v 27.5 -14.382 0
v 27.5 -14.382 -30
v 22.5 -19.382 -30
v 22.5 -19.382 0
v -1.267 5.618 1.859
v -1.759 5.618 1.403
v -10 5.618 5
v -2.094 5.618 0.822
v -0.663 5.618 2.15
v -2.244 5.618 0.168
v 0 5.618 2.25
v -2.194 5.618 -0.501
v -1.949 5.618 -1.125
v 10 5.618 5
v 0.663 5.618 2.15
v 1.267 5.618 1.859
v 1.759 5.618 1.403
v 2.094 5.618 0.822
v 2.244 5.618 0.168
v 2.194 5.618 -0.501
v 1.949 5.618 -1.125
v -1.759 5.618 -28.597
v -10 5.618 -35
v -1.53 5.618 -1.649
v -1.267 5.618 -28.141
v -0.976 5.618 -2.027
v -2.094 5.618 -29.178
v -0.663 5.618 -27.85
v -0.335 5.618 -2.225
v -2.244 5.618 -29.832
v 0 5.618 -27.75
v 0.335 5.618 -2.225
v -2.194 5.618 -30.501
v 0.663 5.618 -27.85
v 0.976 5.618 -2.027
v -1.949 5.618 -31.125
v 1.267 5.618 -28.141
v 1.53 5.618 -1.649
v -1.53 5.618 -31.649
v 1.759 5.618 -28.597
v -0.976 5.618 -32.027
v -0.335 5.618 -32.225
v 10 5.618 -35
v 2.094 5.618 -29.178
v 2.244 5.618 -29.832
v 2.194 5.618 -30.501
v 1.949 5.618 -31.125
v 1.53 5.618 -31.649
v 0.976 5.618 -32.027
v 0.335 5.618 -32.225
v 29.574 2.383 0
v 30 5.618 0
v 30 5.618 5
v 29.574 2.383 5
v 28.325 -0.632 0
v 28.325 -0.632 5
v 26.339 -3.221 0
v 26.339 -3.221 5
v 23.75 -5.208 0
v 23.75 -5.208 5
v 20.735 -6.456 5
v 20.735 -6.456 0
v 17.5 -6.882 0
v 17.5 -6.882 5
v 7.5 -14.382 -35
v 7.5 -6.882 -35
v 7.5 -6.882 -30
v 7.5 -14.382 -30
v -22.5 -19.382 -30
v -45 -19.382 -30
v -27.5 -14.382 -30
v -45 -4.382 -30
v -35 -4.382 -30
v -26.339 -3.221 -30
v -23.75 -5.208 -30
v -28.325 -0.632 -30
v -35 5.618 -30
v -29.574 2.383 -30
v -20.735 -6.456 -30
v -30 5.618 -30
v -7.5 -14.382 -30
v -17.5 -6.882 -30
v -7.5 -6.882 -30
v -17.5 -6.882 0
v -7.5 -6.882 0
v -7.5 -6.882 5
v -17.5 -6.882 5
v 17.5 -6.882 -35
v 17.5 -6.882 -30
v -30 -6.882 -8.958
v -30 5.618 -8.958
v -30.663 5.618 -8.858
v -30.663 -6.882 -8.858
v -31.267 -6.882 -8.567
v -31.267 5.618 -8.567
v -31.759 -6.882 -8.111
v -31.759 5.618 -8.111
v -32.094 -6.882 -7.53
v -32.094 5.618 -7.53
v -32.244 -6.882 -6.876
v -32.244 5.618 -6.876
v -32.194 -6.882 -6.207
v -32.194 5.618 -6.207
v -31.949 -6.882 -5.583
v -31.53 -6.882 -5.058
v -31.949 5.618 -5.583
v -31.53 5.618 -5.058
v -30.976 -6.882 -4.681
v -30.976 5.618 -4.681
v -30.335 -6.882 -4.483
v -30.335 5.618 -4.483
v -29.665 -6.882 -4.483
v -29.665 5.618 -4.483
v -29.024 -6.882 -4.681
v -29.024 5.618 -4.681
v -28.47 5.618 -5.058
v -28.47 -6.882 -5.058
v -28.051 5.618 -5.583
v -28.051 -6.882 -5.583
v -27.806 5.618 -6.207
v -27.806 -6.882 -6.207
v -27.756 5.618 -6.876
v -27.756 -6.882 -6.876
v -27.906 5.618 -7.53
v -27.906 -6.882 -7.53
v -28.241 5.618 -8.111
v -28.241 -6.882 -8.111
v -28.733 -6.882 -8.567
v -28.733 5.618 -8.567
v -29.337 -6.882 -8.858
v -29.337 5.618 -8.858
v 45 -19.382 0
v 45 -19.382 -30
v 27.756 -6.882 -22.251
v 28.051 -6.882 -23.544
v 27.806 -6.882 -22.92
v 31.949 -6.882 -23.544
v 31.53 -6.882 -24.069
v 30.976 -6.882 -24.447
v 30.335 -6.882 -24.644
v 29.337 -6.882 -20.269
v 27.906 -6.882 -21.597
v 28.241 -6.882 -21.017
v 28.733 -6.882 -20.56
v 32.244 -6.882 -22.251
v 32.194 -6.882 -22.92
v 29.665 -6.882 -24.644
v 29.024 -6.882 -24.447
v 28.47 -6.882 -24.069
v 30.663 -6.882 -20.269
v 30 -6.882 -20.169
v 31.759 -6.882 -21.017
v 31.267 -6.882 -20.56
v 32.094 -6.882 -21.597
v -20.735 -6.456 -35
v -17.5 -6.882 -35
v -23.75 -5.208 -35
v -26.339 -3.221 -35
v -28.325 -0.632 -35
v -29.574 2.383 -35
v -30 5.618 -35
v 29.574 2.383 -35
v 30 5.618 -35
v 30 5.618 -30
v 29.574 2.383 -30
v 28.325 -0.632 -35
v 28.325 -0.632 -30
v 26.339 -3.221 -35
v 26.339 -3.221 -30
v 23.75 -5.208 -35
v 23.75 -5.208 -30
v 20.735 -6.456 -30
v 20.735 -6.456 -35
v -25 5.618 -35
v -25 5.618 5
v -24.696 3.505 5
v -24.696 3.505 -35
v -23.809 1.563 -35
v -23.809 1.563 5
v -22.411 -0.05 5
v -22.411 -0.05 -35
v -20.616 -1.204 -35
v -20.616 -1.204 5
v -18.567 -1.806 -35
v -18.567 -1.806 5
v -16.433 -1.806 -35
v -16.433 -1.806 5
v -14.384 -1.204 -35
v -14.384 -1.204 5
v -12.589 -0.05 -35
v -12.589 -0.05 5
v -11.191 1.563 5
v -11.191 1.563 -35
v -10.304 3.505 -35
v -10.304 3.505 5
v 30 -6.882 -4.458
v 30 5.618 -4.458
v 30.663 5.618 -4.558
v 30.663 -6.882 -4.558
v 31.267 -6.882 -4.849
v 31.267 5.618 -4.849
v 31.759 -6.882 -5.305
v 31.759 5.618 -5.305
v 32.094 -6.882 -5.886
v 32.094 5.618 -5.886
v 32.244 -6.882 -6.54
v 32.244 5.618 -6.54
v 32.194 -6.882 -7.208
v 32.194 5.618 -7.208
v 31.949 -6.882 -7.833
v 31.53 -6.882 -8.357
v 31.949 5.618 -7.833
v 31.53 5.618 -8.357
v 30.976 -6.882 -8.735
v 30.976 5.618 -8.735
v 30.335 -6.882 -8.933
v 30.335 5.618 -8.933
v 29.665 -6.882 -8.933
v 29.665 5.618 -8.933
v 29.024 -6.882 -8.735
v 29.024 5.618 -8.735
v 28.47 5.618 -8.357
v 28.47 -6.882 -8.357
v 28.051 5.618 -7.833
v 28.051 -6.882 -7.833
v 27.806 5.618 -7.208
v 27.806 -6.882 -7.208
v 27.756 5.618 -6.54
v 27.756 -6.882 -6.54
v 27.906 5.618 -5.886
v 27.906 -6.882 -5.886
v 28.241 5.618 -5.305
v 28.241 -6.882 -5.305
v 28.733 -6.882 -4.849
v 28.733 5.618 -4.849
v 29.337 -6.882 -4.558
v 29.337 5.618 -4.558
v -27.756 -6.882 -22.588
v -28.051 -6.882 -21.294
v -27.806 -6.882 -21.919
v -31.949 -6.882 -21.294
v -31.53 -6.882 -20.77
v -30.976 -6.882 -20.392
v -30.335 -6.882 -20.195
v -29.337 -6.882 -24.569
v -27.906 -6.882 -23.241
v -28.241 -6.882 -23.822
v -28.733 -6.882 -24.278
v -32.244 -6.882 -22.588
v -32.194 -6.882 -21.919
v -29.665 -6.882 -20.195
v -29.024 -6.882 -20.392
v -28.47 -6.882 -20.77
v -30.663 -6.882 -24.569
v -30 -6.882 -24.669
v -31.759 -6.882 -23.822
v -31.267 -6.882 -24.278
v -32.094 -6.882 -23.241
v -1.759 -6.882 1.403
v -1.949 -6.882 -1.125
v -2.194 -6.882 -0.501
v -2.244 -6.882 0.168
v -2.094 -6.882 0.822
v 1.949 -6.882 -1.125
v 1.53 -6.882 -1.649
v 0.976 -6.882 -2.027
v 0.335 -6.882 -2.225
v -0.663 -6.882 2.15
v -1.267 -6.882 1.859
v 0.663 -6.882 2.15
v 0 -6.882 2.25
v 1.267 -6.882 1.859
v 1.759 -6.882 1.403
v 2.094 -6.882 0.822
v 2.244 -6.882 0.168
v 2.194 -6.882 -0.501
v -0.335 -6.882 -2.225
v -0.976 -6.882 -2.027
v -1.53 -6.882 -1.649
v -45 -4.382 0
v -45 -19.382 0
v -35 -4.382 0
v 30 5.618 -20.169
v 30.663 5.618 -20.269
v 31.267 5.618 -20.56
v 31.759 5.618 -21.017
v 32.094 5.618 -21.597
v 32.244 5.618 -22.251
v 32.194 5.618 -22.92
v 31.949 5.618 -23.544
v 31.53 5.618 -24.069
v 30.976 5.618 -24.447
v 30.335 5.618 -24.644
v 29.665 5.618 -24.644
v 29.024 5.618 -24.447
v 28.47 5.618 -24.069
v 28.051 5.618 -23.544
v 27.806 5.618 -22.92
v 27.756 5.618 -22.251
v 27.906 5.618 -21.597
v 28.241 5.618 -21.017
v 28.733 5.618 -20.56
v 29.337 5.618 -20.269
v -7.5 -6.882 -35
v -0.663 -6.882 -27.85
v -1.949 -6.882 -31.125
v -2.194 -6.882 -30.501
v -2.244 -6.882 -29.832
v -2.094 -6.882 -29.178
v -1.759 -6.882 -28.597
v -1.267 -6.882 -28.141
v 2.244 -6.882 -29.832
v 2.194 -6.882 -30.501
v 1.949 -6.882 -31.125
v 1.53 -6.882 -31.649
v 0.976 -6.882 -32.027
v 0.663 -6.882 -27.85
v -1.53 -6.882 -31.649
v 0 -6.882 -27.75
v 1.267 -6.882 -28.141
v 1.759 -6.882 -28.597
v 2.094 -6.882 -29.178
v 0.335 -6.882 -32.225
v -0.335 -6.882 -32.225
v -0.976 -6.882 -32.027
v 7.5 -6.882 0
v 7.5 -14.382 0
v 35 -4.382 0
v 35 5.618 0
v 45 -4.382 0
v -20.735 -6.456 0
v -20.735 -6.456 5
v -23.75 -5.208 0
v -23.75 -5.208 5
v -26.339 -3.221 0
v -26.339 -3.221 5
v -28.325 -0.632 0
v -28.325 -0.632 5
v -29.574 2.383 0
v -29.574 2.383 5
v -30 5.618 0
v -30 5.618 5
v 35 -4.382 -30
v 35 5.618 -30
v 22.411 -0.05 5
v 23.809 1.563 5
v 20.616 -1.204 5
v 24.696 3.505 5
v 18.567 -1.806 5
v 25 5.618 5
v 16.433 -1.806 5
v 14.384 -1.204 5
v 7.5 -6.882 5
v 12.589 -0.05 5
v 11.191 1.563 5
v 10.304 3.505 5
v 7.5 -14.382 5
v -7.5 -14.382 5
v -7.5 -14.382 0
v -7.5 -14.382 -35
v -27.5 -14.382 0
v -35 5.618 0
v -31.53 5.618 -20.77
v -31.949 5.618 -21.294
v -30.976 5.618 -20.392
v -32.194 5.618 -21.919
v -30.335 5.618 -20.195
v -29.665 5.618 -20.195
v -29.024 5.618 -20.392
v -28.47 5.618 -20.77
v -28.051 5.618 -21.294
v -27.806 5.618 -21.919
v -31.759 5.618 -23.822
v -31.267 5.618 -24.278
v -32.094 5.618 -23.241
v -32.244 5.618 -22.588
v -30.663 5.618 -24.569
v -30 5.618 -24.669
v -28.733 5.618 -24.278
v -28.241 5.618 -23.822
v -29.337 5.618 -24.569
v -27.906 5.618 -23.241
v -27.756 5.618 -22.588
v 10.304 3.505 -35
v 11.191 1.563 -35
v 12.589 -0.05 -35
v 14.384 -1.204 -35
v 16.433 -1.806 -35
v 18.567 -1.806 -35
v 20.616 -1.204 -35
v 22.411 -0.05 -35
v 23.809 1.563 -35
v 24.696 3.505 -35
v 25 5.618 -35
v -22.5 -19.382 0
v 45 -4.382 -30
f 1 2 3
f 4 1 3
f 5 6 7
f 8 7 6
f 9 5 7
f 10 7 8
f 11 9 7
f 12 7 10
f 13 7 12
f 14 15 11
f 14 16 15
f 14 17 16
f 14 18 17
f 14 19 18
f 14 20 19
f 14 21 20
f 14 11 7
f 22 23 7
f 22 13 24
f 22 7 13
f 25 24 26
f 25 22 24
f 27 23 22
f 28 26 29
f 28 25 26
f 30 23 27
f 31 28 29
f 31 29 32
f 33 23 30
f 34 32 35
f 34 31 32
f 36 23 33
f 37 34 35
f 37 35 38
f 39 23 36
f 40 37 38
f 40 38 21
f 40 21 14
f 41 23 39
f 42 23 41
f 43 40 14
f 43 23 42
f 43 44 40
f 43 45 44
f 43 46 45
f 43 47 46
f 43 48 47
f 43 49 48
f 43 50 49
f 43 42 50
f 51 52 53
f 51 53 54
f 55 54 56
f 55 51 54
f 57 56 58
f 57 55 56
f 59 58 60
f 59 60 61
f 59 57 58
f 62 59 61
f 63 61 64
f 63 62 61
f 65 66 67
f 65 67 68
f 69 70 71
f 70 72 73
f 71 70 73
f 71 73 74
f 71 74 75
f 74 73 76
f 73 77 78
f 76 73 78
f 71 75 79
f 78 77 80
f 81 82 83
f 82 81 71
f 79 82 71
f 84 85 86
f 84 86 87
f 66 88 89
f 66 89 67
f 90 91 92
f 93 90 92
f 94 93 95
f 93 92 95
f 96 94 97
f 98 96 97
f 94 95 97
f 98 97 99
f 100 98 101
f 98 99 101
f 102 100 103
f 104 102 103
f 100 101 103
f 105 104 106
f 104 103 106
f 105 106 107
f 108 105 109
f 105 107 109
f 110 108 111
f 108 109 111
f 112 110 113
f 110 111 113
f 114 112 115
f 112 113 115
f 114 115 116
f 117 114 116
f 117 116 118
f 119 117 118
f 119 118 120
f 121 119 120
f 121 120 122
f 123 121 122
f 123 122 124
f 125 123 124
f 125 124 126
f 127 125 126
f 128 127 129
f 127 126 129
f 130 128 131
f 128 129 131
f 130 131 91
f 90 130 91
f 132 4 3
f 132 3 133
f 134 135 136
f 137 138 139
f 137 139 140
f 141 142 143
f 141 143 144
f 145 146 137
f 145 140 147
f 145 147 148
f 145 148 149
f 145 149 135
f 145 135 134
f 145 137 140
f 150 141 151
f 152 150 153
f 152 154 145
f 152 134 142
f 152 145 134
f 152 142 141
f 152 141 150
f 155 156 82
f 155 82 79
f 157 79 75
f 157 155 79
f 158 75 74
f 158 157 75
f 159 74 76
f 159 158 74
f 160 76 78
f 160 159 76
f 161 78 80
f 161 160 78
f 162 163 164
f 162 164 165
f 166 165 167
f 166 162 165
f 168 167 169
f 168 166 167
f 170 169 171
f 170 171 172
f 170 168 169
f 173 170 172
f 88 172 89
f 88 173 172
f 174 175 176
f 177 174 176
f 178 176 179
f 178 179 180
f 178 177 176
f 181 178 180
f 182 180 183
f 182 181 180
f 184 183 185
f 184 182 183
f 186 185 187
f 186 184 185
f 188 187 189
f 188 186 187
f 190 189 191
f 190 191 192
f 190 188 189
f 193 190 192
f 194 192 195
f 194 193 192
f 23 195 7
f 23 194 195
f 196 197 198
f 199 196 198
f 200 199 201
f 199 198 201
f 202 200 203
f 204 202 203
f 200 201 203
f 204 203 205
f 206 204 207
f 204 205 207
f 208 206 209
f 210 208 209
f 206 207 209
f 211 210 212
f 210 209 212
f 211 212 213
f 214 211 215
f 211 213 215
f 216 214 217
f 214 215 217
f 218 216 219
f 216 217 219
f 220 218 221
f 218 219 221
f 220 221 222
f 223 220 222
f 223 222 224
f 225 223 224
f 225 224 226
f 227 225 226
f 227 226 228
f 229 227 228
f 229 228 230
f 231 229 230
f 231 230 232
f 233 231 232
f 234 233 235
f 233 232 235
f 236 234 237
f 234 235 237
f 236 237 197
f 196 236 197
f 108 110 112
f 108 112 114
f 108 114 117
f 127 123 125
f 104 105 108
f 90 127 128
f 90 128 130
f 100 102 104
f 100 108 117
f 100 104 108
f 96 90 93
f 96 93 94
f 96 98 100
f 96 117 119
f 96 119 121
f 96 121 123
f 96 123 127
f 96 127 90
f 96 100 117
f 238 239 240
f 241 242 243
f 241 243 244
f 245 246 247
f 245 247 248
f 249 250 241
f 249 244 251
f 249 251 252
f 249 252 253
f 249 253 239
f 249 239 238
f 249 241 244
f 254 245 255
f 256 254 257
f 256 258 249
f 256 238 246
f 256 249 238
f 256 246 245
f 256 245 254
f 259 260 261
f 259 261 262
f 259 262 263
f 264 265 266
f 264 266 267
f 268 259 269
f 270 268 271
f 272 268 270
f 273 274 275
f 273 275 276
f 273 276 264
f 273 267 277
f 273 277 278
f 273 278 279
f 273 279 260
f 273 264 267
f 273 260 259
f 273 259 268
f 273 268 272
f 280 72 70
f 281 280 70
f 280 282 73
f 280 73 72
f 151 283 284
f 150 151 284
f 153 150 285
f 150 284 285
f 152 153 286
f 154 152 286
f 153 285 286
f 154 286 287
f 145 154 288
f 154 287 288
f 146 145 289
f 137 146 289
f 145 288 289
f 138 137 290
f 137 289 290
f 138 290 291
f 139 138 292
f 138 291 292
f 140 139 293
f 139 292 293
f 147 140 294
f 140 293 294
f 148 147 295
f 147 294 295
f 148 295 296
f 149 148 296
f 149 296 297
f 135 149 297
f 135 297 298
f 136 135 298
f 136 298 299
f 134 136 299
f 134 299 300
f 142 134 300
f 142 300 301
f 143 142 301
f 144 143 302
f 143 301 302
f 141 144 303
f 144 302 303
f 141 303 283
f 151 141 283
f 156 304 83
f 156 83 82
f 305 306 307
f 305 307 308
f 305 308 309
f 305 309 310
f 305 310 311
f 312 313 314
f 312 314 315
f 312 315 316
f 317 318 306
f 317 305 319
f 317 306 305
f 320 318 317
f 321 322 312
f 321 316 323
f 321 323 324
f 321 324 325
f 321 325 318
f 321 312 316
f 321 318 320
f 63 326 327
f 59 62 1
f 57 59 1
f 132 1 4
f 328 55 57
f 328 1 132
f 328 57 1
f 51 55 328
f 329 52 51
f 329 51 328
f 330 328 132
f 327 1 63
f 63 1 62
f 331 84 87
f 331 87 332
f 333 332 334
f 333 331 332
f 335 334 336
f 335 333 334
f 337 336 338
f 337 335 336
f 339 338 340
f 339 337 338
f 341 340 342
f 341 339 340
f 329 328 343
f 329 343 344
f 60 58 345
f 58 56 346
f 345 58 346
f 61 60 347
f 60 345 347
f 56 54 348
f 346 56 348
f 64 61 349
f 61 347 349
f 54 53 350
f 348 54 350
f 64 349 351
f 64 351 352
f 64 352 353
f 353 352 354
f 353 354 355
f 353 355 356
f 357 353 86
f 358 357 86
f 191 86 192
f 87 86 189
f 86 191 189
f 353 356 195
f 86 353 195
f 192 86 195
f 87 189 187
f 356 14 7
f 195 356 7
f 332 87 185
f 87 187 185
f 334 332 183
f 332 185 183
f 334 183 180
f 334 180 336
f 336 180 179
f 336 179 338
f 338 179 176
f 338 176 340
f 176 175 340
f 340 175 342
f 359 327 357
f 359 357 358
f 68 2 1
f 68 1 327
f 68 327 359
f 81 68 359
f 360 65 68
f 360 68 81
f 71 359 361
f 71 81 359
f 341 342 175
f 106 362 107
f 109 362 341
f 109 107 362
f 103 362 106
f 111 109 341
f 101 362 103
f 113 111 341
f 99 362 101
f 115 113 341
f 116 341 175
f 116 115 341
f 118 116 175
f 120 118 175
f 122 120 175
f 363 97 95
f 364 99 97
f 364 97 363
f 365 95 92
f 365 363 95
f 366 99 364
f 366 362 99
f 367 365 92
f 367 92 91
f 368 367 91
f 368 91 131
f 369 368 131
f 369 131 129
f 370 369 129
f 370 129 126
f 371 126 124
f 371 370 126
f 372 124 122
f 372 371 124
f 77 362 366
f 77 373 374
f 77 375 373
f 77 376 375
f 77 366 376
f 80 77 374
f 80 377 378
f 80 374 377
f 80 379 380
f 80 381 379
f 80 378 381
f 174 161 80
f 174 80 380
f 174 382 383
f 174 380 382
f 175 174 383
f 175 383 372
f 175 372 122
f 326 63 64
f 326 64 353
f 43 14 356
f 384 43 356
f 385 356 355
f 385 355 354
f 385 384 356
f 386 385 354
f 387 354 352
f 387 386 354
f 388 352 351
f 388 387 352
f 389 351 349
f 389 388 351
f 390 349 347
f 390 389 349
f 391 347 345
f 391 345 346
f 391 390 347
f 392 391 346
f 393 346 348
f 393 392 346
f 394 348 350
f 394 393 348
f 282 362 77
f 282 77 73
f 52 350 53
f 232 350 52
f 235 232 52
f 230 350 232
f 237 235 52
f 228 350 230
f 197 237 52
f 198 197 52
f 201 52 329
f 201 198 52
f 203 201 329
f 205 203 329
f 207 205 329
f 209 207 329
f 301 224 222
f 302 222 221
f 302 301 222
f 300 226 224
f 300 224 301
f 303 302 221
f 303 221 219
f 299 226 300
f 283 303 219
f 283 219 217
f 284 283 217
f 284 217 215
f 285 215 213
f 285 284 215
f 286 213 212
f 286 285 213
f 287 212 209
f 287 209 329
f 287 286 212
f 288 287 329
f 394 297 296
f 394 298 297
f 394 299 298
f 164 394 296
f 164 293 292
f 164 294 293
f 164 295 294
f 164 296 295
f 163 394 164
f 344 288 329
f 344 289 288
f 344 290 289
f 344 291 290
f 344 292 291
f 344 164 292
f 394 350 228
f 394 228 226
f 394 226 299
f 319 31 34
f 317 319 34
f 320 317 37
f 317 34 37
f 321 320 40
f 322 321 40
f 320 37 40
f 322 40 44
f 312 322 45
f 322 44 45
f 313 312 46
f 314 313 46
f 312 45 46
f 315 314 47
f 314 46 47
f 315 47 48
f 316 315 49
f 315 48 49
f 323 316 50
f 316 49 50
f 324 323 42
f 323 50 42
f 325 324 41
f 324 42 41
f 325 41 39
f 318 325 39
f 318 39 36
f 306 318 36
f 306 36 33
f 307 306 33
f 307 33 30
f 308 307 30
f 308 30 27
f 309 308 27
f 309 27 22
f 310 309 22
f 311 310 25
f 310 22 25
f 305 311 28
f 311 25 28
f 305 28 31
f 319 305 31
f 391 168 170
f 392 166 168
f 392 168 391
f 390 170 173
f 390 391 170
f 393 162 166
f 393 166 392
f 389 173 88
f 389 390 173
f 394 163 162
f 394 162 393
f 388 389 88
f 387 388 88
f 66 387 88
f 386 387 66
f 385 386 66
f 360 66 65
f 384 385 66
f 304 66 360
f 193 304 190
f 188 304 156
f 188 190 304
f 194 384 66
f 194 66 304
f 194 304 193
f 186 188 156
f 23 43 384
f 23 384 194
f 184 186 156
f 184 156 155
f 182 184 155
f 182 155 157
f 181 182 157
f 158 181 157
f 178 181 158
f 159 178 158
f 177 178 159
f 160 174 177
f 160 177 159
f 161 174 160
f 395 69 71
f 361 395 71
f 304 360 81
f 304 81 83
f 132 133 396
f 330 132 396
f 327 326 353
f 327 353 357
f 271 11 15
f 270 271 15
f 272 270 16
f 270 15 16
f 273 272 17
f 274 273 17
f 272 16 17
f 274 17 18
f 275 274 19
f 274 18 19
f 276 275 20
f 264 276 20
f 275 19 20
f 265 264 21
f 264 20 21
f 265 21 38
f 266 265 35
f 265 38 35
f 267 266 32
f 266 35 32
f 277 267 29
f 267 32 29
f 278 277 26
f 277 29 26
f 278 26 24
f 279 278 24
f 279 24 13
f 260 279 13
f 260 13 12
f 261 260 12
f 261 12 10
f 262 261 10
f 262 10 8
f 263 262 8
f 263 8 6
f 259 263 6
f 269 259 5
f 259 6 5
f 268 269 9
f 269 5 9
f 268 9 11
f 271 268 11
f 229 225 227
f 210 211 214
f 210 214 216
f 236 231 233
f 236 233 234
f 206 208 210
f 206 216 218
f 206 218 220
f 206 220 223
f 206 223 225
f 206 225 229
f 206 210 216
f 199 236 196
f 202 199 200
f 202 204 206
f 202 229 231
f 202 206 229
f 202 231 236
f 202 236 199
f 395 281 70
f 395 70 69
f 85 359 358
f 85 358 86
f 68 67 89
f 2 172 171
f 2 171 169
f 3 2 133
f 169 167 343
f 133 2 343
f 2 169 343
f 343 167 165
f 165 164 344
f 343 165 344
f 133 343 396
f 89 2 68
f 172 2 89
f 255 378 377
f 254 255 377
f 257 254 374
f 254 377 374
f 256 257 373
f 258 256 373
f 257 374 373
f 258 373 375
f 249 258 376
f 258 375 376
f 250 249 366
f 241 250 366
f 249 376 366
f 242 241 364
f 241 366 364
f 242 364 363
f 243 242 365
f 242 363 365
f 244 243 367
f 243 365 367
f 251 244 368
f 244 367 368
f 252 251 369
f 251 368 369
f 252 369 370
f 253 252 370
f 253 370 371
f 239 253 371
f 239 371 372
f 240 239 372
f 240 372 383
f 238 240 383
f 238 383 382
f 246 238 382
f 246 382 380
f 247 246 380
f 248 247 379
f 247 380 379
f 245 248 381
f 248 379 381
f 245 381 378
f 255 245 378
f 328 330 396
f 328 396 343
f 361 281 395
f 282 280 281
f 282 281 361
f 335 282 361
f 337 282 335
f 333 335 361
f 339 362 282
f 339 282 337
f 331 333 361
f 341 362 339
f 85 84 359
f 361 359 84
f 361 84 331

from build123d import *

# Parameters (mm, degrees)
BOSS_EXTRUDE1_DEPTH = 30
BOSS_EXTRUDE2_DEPTH = 5
CUT_EXTRUDE1_START  = -69
CUT_EXTRUDE1_DEPTH  = 69
BOSS_EXTRUDE3_START = 5
BOSS_EXTRUDE3_DEPTH = 5
SKETCH7_R           = 2.25
CUT_EXTRUDE3_DEPTH  = 12.5
SKETCH8_R           = 2.25
CUT_EXTRUDE4_DEPTH  = 12.5


with BuildPart() as part:
    # Sketch1 → Boss-Extrude1 (new body)
    with BuildSketch(Plane.XY):
        Polygon((-27.5, -14.382195086), (27.5, -14.382195086), (22.5, -19.382195086), (45, -19.382195086), (45, -4.382195086), (35, -4.382195086), (35, 5.617804914), (-35, 5.617804914), (-35, -4.382195086), (-45, -4.382195086), (-45, -19.382195086), (-22.5, -19.382195086), align=None)
    extrude(amount=-BOSS_EXTRUDE1_DEPTH)

    # Sketch2 → Boss-Extrude2 (add)
    with BuildSketch(Plane.XY):
        with BuildLine():
            Line((-10, 5.617804914), (10, 5.617804914))
            ThreePointArc((10, 5.617804914), (17.5, -1.882195086), (25, 5.617804914))
            Line((25, 5.617804914), (30, 5.617804914))
            ThreePointArc((30, 5.617804914), (26.338834765, -3.221029851), (17.5, -6.882195086))
            Line((17.5, -6.882195086), (7.5, -6.882195086))
            Line((7.5, -6.882195086), (7.5, -14.382195086))
            Line((7.5, -14.382195086), (-7.5, -14.382195086))
            Line((-7.5, -14.382195086), (-7.5, -6.882195086))
            Line((-7.5, -6.882195086), (-17.5, -6.882195086))
            ThreePointArc((-17.5, -6.882195086), (-26.338834765, -3.221029851), (-30, 5.617804914))
            Line((-30, 5.617804914), (-25, 5.617804914))
            ThreePointArc((-25, 5.617804914), (-17.5, -1.882195086), (-10, 5.617804914))
        make_face()
    extrude(amount=BOSS_EXTRUDE2_DEPTH)

    # Sketch3 → Cut-Extrude1 (cut)
    with BuildSketch(Plane.XY.offset(5).offset(CUT_EXTRUDE1_START)):
        with BuildLine():
            Line((-25, 5.617804914), (-10, 5.617804914))
            ThreePointArc((-10, 5.617804914), (-17.5, -1.882195086), (-25, 5.617804914))
        make_face()
        with BuildLine():
            Line((10, 5.617804914), (25, 5.617804914))
            ThreePointArc((25, 5.617804914), (17.5, -1.882195086), (10, 5.617804914))
        make_face()
    extrude(amount=CUT_EXTRUDE1_DEPTH, mode=Mode.SUBTRACT)

    # Sketch4 → Boss-Extrude3 (add)
    with BuildSketch(Plane(origin=(0, 0, -30), x_dir=(-1, 0, 0), z_dir=(0, 0, -1)).offset(BOSS_EXTRUDE3_START)):
        with BuildLine():
            Line((-17.5, -6.882195086), (-7.5, -6.882195086))
            Line((-7.5, -6.882195086), (-7.5, -14.382195086))
            Line((-7.5, -14.382195086), (7.5, -14.382195086))
            Line((7.5, -14.382195086), (7.5, -6.882195086))
            Line((7.5, -6.882195086), (17.5, -6.882195086))
            ThreePointArc((17.5, -6.882195086), (26.338834765, -3.221029851), (30, 5.617804914))
            Line((30, 5.617804914), (25, 5.617804914))
            ThreePointArc((25, 5.617804914), (17.5, -1.882195086), (10, 5.617804914))
            Line((10, 5.617804914), (-10, 5.617804914))
            ThreePointArc((-10, 5.617804914), (-17.5, -1.882195086), (-25, 5.617804914))
            Line((-25, 5.617804914), (-30, 5.617804914))
            ThreePointArc((-30, 5.617804914), (-26.338834765, -3.221029851), (-17.5, -6.882195086))
        make_face()
    extrude(amount=-BOSS_EXTRUDE3_DEPTH)

    # Sketch7 → Cut-Extrude3 (cut)
    with BuildSketch(Plane(origin=(0, 5.617804914, 0), x_dir=(1, 0, 0), z_dir=(0, 1, 0))):
        with Locations(Location((0, 30, 0), (0, 0, 270))):
            Circle(SKETCH7_R)
        with Locations(Location((0, 0, 0), (0, 0, 270))):
            Circle(SKETCH7_R)
    extrude(amount=-CUT_EXTRUDE3_DEPTH, mode=Mode.SUBTRACT)

    # Sketch8 → Cut-Extrude4 (cut)
    with BuildSketch(Plane(origin=(0, 5.617804914, 0), x_dir=(1, 0, 0), z_dir=(0, 1, 0))):
        with Locations(Location((30, 22.419418388, 0), (0, 0, 270))):
            Circle(SKETCH8_R)
        with Locations(Location((30, 6.707708861, 0), (0, 0, 270))):
            Circle(SKETCH8_R)
        with Locations(Location((-30, 6.707708861, 0), (0, 0, 90))):
            Circle(SKETCH8_R)
        with Locations(Location((-30, 22.419418388, 0), (0, 0, 90))):
            Circle(SKETCH8_R)
    extrude(amount=-CUT_EXTRUDE4_DEPTH, mode=Mode.SUBTRACT)


solid = part.part
